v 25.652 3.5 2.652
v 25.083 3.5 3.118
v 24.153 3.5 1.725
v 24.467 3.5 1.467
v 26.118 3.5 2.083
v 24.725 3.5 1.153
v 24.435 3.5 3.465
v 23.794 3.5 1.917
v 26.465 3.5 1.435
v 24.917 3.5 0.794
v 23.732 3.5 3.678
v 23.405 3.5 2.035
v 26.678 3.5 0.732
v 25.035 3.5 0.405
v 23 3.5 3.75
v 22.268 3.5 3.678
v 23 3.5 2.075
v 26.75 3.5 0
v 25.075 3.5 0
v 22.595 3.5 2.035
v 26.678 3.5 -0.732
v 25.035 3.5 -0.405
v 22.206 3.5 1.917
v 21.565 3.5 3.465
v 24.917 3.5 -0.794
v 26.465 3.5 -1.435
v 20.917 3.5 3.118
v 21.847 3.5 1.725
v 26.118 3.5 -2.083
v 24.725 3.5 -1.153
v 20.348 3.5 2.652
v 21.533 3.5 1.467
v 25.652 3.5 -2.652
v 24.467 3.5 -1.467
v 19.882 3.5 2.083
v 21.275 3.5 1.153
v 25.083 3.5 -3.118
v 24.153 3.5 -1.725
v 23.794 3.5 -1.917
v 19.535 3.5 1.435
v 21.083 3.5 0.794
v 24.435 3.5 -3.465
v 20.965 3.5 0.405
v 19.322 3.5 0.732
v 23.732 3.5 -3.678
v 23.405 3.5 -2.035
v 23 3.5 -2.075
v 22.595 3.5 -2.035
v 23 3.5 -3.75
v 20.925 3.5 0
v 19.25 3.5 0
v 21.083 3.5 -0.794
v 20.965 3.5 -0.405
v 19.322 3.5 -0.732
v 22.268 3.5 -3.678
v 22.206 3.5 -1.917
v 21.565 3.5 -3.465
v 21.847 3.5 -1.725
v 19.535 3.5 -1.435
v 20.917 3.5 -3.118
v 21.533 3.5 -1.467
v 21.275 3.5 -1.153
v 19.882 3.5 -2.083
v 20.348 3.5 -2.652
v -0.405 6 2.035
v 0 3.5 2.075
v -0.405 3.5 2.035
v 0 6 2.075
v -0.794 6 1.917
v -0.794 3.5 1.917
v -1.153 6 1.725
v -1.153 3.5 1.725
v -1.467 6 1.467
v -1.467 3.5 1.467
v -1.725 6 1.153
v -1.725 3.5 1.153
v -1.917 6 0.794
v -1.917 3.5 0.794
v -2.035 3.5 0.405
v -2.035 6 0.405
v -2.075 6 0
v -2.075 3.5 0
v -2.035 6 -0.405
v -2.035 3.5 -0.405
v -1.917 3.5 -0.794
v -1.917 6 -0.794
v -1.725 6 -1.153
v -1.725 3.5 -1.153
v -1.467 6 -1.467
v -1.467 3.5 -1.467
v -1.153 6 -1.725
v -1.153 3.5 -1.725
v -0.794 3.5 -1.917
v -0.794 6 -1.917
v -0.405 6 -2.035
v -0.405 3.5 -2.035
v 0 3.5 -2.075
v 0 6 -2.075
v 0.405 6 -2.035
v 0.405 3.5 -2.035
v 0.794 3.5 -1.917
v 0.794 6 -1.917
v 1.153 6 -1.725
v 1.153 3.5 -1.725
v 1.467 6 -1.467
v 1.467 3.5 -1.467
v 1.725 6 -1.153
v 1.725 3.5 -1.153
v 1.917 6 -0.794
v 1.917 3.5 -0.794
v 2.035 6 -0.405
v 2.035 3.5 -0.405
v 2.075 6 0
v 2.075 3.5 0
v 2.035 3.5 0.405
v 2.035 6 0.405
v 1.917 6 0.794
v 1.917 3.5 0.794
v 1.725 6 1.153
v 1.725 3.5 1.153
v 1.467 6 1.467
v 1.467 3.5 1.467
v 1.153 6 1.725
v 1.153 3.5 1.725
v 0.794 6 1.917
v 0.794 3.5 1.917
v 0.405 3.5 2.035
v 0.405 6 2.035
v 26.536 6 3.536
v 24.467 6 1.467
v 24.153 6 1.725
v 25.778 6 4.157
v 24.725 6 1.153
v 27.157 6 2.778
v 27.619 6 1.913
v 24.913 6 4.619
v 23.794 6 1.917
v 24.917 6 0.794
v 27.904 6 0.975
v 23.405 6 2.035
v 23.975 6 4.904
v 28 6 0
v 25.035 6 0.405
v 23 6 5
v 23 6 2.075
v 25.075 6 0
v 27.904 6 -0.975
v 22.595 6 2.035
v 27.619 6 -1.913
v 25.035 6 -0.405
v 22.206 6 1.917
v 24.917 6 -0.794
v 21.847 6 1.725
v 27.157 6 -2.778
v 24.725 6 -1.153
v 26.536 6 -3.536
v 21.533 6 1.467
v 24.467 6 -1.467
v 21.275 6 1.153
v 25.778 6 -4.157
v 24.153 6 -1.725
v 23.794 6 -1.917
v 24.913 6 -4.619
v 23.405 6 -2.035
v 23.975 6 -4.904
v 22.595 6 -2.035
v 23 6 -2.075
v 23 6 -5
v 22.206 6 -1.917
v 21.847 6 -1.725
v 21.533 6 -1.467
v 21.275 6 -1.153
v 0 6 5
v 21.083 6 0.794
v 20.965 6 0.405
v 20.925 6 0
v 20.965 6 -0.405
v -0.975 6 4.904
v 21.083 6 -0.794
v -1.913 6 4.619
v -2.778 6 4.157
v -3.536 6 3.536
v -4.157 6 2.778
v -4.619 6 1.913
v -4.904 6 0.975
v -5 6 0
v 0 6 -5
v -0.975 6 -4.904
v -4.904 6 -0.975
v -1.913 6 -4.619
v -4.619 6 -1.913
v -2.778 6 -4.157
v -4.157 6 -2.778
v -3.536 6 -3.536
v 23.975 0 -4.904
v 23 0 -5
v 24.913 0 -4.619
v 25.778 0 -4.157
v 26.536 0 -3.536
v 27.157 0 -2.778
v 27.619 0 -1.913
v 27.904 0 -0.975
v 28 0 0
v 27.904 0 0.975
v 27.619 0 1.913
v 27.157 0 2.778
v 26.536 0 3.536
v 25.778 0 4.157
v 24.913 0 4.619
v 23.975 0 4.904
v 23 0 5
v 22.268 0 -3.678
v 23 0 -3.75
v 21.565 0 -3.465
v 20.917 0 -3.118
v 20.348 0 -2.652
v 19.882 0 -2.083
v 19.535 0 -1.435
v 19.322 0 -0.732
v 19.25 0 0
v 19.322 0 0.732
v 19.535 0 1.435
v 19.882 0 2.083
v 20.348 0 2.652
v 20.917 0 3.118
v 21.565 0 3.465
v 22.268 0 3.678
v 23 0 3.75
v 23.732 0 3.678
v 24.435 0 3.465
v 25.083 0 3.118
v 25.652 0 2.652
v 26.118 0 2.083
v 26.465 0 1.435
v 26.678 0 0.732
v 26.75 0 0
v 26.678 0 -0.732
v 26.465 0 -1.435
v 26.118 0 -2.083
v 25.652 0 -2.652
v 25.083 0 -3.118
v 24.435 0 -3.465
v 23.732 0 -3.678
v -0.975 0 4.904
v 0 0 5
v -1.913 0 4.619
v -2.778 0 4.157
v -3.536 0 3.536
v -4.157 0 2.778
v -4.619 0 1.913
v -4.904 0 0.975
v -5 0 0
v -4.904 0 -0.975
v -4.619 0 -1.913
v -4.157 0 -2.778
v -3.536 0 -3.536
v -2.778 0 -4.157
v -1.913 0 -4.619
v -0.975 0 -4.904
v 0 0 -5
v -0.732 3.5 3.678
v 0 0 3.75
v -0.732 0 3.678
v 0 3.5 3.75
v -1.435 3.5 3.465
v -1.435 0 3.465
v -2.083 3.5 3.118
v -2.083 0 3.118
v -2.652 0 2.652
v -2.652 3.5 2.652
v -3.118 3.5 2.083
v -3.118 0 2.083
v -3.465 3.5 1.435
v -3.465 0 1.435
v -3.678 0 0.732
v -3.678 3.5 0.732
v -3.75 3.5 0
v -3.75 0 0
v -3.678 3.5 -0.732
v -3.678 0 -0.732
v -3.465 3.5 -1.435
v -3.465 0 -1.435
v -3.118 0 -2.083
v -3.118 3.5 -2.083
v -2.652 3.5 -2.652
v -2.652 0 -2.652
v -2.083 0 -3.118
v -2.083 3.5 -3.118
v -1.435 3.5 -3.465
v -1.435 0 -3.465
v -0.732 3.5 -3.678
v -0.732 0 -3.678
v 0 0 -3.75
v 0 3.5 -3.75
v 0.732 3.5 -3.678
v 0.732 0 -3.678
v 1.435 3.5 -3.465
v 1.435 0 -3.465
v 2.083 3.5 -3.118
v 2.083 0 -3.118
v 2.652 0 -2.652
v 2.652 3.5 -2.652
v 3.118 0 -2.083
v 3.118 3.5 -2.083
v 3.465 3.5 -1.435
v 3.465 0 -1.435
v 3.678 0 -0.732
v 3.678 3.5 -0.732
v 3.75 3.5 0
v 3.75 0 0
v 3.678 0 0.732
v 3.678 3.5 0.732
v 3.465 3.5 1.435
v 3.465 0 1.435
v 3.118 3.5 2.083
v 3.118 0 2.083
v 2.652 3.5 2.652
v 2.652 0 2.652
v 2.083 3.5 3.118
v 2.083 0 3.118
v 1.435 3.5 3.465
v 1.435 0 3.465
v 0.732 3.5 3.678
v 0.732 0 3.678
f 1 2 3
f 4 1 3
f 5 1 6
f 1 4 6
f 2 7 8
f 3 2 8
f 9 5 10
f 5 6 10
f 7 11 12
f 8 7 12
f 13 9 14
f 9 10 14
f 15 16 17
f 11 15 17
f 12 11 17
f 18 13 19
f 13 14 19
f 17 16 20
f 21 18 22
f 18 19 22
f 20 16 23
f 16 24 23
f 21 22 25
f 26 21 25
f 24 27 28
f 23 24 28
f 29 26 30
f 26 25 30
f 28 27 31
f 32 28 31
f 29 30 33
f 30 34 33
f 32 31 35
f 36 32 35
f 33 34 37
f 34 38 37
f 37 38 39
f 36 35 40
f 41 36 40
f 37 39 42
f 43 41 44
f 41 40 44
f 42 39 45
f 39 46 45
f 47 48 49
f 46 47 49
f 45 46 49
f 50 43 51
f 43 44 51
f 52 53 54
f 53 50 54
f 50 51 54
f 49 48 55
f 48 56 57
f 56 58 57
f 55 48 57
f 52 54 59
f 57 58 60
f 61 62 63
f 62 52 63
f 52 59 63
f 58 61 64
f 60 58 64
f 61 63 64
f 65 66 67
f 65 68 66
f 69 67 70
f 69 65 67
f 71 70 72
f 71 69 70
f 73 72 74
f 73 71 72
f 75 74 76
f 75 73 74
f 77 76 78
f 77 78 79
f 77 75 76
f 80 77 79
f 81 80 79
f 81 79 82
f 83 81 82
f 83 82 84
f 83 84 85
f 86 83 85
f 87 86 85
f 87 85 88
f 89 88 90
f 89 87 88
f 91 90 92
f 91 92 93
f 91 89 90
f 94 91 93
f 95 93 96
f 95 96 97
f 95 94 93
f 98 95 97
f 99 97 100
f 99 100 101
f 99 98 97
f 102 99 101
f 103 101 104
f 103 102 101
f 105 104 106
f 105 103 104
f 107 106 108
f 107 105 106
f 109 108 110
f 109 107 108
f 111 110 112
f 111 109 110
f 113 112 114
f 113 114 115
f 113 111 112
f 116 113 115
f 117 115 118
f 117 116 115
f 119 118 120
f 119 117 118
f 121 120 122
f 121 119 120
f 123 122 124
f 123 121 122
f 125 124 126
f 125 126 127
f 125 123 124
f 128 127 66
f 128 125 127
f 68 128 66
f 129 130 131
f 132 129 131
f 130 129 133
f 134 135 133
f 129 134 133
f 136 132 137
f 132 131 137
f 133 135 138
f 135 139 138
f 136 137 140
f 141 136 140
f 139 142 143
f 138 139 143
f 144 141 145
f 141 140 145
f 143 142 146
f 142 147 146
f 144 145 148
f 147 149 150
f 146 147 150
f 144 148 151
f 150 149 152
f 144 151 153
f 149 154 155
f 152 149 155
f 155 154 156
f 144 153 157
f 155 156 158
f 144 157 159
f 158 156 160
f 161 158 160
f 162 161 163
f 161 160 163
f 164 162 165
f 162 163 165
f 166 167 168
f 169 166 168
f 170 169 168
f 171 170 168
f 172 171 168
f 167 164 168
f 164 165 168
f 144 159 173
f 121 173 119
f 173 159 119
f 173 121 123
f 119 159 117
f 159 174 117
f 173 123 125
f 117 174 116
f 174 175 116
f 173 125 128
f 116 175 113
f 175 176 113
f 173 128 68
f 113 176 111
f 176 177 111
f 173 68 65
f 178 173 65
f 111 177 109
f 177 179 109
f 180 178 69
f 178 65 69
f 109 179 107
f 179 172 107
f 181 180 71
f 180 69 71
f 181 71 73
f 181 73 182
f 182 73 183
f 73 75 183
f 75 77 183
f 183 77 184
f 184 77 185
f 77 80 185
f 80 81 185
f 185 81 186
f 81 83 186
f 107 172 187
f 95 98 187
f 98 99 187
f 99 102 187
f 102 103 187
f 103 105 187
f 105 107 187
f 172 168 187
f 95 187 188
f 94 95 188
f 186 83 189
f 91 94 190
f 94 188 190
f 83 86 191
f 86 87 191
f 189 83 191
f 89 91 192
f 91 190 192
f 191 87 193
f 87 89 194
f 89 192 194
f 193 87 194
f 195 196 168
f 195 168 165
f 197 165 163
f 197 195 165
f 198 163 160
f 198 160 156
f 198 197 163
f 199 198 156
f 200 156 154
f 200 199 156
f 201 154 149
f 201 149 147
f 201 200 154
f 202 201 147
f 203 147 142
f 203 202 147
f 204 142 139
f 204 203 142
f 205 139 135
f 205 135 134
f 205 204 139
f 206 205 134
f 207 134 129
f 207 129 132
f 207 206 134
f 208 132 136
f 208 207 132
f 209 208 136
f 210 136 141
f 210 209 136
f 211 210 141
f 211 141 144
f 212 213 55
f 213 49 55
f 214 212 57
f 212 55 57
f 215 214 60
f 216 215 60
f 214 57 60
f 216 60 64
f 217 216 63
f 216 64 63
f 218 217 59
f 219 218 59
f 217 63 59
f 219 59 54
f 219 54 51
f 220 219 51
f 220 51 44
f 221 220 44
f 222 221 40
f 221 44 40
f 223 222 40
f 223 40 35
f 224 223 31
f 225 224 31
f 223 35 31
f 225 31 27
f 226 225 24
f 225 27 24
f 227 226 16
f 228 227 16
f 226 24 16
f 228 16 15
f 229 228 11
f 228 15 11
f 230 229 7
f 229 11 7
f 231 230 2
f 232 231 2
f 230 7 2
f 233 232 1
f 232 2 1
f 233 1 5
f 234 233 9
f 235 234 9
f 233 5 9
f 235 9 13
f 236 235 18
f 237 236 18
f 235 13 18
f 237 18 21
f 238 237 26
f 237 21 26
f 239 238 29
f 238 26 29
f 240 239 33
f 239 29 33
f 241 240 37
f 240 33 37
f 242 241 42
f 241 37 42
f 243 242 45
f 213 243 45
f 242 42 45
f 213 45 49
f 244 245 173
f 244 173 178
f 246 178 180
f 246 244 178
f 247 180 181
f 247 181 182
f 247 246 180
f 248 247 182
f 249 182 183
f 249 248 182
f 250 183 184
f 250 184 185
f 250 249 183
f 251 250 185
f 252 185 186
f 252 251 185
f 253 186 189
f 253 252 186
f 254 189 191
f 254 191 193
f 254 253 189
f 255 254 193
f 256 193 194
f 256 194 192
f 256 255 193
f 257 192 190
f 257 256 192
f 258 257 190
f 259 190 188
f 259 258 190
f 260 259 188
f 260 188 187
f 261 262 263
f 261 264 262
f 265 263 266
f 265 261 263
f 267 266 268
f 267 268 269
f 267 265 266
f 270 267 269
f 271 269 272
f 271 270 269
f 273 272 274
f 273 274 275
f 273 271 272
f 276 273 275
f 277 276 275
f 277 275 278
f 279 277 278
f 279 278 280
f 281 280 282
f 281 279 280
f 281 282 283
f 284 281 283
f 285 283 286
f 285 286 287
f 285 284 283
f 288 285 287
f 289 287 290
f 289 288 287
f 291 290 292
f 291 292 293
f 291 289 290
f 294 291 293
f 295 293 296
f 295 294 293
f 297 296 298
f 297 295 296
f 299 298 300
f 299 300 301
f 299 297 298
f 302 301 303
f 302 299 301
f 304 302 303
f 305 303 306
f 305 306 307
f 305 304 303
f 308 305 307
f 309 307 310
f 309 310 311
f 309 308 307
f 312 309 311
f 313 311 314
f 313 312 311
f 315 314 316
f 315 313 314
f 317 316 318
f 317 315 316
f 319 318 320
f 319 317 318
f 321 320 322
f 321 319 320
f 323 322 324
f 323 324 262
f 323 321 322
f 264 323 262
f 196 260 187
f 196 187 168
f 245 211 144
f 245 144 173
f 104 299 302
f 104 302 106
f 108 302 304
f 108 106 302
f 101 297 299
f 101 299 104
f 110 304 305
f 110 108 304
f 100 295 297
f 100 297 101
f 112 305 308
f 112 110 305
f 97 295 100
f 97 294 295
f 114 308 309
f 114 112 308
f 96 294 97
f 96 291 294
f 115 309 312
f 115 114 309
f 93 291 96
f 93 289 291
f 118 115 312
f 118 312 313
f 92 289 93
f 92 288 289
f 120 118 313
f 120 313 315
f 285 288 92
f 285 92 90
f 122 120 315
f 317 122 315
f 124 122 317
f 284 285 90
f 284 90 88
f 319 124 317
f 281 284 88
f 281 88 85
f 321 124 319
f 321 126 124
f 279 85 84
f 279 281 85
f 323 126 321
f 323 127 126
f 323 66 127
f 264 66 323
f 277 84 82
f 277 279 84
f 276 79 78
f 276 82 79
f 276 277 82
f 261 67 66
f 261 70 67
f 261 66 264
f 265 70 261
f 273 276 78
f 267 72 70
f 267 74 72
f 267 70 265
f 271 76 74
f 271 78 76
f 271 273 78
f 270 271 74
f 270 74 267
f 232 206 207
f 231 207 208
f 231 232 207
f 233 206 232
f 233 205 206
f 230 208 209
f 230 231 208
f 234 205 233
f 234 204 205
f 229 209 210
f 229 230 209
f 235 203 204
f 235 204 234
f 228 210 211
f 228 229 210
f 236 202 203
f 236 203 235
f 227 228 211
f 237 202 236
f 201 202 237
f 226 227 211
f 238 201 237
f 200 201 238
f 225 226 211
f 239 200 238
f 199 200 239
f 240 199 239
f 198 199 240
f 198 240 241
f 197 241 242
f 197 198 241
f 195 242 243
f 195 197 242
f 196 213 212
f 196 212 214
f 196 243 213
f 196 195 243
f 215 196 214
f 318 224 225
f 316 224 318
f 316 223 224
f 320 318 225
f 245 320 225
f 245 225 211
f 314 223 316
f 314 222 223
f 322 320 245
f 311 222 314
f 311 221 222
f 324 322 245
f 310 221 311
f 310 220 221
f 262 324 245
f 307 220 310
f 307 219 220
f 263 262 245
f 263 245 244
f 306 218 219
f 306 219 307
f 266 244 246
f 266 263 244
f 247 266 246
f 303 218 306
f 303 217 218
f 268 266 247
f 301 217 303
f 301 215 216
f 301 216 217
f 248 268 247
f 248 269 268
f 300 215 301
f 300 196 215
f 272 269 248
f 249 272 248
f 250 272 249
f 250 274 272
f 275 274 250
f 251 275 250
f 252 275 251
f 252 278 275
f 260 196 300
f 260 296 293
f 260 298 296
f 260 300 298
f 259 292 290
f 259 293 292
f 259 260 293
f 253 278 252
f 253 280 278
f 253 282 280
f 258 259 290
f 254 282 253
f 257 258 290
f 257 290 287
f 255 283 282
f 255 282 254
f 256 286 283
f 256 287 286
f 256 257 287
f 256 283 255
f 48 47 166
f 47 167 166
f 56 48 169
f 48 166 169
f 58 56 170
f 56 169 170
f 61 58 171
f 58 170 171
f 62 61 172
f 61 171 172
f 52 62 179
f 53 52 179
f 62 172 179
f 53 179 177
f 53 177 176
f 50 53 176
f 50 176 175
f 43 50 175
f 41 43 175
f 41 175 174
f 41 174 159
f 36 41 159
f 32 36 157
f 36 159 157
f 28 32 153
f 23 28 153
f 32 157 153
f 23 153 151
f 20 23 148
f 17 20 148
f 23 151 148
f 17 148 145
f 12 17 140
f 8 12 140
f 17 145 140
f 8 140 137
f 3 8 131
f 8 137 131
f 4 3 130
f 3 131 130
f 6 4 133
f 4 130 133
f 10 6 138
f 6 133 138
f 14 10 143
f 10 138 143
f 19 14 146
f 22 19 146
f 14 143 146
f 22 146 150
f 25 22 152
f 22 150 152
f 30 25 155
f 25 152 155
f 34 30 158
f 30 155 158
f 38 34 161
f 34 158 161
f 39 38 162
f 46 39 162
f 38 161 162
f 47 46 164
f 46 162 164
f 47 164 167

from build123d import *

# Parameters (mm, degrees)
EXTRUDE_1_DEPTH = 6


with BuildPart() as part:
    # 草图1 → 凸台-拉伸1 (new body)
    with BuildSketch(Plane(origin=(0, 0, 0), x_dir=(1, 0, 0), z_dir=(0, 1, 0))):
        with BuildLine():
            Line((0, 5), (23, 5))
            ThreePointArc((23, 5), (28, 0), (23, -5))
            Line((23, -5), (0, -5))
            ThreePointArc((0, -5), (-5, 0), (0, 5))
        make_face()
    extrude(amount=EXTRUDE_1_DEPTH)

    # 草图2 → 切除-旋转1 (revolve, cut)
    with BuildSketch(Plane.XY, mode=Mode.PRIVATE) as cut_revolve_1_sk:
        Polygon((0, 0), (-3.75, 0), (-3.75, 3.5), (-2.075, 3.5), (-2.075, 6), (0, 6), align=None)
    revolve(cut_revolve_1_sk.sketch.rotate(Axis((0, 6, 0), (0, -1, 0)), 270), axis=Axis((0, 6, 0), (0, -1, 0)), mode=Mode.SUBTRACT)

    # 草图3 → 切除-旋转2 (revolve, cut)
    with BuildSketch(Plane.XY, mode=Mode.PRIVATE) as cut_revolve_2_sk:
        Polygon((23, 0), (19.25, 0), (19.25, 3.5), (20.925, 3.5), (20.925, 6), (23, 6), align=None)
    revolve(cut_revolve_2_sk.sketch.rotate(Axis((23, 0, 0), (0, 1, 0)), 270), axis=Axis((23, 0, 0), (0, 1, 0)), mode=Mode.SUBTRACT)


solid = part.part
